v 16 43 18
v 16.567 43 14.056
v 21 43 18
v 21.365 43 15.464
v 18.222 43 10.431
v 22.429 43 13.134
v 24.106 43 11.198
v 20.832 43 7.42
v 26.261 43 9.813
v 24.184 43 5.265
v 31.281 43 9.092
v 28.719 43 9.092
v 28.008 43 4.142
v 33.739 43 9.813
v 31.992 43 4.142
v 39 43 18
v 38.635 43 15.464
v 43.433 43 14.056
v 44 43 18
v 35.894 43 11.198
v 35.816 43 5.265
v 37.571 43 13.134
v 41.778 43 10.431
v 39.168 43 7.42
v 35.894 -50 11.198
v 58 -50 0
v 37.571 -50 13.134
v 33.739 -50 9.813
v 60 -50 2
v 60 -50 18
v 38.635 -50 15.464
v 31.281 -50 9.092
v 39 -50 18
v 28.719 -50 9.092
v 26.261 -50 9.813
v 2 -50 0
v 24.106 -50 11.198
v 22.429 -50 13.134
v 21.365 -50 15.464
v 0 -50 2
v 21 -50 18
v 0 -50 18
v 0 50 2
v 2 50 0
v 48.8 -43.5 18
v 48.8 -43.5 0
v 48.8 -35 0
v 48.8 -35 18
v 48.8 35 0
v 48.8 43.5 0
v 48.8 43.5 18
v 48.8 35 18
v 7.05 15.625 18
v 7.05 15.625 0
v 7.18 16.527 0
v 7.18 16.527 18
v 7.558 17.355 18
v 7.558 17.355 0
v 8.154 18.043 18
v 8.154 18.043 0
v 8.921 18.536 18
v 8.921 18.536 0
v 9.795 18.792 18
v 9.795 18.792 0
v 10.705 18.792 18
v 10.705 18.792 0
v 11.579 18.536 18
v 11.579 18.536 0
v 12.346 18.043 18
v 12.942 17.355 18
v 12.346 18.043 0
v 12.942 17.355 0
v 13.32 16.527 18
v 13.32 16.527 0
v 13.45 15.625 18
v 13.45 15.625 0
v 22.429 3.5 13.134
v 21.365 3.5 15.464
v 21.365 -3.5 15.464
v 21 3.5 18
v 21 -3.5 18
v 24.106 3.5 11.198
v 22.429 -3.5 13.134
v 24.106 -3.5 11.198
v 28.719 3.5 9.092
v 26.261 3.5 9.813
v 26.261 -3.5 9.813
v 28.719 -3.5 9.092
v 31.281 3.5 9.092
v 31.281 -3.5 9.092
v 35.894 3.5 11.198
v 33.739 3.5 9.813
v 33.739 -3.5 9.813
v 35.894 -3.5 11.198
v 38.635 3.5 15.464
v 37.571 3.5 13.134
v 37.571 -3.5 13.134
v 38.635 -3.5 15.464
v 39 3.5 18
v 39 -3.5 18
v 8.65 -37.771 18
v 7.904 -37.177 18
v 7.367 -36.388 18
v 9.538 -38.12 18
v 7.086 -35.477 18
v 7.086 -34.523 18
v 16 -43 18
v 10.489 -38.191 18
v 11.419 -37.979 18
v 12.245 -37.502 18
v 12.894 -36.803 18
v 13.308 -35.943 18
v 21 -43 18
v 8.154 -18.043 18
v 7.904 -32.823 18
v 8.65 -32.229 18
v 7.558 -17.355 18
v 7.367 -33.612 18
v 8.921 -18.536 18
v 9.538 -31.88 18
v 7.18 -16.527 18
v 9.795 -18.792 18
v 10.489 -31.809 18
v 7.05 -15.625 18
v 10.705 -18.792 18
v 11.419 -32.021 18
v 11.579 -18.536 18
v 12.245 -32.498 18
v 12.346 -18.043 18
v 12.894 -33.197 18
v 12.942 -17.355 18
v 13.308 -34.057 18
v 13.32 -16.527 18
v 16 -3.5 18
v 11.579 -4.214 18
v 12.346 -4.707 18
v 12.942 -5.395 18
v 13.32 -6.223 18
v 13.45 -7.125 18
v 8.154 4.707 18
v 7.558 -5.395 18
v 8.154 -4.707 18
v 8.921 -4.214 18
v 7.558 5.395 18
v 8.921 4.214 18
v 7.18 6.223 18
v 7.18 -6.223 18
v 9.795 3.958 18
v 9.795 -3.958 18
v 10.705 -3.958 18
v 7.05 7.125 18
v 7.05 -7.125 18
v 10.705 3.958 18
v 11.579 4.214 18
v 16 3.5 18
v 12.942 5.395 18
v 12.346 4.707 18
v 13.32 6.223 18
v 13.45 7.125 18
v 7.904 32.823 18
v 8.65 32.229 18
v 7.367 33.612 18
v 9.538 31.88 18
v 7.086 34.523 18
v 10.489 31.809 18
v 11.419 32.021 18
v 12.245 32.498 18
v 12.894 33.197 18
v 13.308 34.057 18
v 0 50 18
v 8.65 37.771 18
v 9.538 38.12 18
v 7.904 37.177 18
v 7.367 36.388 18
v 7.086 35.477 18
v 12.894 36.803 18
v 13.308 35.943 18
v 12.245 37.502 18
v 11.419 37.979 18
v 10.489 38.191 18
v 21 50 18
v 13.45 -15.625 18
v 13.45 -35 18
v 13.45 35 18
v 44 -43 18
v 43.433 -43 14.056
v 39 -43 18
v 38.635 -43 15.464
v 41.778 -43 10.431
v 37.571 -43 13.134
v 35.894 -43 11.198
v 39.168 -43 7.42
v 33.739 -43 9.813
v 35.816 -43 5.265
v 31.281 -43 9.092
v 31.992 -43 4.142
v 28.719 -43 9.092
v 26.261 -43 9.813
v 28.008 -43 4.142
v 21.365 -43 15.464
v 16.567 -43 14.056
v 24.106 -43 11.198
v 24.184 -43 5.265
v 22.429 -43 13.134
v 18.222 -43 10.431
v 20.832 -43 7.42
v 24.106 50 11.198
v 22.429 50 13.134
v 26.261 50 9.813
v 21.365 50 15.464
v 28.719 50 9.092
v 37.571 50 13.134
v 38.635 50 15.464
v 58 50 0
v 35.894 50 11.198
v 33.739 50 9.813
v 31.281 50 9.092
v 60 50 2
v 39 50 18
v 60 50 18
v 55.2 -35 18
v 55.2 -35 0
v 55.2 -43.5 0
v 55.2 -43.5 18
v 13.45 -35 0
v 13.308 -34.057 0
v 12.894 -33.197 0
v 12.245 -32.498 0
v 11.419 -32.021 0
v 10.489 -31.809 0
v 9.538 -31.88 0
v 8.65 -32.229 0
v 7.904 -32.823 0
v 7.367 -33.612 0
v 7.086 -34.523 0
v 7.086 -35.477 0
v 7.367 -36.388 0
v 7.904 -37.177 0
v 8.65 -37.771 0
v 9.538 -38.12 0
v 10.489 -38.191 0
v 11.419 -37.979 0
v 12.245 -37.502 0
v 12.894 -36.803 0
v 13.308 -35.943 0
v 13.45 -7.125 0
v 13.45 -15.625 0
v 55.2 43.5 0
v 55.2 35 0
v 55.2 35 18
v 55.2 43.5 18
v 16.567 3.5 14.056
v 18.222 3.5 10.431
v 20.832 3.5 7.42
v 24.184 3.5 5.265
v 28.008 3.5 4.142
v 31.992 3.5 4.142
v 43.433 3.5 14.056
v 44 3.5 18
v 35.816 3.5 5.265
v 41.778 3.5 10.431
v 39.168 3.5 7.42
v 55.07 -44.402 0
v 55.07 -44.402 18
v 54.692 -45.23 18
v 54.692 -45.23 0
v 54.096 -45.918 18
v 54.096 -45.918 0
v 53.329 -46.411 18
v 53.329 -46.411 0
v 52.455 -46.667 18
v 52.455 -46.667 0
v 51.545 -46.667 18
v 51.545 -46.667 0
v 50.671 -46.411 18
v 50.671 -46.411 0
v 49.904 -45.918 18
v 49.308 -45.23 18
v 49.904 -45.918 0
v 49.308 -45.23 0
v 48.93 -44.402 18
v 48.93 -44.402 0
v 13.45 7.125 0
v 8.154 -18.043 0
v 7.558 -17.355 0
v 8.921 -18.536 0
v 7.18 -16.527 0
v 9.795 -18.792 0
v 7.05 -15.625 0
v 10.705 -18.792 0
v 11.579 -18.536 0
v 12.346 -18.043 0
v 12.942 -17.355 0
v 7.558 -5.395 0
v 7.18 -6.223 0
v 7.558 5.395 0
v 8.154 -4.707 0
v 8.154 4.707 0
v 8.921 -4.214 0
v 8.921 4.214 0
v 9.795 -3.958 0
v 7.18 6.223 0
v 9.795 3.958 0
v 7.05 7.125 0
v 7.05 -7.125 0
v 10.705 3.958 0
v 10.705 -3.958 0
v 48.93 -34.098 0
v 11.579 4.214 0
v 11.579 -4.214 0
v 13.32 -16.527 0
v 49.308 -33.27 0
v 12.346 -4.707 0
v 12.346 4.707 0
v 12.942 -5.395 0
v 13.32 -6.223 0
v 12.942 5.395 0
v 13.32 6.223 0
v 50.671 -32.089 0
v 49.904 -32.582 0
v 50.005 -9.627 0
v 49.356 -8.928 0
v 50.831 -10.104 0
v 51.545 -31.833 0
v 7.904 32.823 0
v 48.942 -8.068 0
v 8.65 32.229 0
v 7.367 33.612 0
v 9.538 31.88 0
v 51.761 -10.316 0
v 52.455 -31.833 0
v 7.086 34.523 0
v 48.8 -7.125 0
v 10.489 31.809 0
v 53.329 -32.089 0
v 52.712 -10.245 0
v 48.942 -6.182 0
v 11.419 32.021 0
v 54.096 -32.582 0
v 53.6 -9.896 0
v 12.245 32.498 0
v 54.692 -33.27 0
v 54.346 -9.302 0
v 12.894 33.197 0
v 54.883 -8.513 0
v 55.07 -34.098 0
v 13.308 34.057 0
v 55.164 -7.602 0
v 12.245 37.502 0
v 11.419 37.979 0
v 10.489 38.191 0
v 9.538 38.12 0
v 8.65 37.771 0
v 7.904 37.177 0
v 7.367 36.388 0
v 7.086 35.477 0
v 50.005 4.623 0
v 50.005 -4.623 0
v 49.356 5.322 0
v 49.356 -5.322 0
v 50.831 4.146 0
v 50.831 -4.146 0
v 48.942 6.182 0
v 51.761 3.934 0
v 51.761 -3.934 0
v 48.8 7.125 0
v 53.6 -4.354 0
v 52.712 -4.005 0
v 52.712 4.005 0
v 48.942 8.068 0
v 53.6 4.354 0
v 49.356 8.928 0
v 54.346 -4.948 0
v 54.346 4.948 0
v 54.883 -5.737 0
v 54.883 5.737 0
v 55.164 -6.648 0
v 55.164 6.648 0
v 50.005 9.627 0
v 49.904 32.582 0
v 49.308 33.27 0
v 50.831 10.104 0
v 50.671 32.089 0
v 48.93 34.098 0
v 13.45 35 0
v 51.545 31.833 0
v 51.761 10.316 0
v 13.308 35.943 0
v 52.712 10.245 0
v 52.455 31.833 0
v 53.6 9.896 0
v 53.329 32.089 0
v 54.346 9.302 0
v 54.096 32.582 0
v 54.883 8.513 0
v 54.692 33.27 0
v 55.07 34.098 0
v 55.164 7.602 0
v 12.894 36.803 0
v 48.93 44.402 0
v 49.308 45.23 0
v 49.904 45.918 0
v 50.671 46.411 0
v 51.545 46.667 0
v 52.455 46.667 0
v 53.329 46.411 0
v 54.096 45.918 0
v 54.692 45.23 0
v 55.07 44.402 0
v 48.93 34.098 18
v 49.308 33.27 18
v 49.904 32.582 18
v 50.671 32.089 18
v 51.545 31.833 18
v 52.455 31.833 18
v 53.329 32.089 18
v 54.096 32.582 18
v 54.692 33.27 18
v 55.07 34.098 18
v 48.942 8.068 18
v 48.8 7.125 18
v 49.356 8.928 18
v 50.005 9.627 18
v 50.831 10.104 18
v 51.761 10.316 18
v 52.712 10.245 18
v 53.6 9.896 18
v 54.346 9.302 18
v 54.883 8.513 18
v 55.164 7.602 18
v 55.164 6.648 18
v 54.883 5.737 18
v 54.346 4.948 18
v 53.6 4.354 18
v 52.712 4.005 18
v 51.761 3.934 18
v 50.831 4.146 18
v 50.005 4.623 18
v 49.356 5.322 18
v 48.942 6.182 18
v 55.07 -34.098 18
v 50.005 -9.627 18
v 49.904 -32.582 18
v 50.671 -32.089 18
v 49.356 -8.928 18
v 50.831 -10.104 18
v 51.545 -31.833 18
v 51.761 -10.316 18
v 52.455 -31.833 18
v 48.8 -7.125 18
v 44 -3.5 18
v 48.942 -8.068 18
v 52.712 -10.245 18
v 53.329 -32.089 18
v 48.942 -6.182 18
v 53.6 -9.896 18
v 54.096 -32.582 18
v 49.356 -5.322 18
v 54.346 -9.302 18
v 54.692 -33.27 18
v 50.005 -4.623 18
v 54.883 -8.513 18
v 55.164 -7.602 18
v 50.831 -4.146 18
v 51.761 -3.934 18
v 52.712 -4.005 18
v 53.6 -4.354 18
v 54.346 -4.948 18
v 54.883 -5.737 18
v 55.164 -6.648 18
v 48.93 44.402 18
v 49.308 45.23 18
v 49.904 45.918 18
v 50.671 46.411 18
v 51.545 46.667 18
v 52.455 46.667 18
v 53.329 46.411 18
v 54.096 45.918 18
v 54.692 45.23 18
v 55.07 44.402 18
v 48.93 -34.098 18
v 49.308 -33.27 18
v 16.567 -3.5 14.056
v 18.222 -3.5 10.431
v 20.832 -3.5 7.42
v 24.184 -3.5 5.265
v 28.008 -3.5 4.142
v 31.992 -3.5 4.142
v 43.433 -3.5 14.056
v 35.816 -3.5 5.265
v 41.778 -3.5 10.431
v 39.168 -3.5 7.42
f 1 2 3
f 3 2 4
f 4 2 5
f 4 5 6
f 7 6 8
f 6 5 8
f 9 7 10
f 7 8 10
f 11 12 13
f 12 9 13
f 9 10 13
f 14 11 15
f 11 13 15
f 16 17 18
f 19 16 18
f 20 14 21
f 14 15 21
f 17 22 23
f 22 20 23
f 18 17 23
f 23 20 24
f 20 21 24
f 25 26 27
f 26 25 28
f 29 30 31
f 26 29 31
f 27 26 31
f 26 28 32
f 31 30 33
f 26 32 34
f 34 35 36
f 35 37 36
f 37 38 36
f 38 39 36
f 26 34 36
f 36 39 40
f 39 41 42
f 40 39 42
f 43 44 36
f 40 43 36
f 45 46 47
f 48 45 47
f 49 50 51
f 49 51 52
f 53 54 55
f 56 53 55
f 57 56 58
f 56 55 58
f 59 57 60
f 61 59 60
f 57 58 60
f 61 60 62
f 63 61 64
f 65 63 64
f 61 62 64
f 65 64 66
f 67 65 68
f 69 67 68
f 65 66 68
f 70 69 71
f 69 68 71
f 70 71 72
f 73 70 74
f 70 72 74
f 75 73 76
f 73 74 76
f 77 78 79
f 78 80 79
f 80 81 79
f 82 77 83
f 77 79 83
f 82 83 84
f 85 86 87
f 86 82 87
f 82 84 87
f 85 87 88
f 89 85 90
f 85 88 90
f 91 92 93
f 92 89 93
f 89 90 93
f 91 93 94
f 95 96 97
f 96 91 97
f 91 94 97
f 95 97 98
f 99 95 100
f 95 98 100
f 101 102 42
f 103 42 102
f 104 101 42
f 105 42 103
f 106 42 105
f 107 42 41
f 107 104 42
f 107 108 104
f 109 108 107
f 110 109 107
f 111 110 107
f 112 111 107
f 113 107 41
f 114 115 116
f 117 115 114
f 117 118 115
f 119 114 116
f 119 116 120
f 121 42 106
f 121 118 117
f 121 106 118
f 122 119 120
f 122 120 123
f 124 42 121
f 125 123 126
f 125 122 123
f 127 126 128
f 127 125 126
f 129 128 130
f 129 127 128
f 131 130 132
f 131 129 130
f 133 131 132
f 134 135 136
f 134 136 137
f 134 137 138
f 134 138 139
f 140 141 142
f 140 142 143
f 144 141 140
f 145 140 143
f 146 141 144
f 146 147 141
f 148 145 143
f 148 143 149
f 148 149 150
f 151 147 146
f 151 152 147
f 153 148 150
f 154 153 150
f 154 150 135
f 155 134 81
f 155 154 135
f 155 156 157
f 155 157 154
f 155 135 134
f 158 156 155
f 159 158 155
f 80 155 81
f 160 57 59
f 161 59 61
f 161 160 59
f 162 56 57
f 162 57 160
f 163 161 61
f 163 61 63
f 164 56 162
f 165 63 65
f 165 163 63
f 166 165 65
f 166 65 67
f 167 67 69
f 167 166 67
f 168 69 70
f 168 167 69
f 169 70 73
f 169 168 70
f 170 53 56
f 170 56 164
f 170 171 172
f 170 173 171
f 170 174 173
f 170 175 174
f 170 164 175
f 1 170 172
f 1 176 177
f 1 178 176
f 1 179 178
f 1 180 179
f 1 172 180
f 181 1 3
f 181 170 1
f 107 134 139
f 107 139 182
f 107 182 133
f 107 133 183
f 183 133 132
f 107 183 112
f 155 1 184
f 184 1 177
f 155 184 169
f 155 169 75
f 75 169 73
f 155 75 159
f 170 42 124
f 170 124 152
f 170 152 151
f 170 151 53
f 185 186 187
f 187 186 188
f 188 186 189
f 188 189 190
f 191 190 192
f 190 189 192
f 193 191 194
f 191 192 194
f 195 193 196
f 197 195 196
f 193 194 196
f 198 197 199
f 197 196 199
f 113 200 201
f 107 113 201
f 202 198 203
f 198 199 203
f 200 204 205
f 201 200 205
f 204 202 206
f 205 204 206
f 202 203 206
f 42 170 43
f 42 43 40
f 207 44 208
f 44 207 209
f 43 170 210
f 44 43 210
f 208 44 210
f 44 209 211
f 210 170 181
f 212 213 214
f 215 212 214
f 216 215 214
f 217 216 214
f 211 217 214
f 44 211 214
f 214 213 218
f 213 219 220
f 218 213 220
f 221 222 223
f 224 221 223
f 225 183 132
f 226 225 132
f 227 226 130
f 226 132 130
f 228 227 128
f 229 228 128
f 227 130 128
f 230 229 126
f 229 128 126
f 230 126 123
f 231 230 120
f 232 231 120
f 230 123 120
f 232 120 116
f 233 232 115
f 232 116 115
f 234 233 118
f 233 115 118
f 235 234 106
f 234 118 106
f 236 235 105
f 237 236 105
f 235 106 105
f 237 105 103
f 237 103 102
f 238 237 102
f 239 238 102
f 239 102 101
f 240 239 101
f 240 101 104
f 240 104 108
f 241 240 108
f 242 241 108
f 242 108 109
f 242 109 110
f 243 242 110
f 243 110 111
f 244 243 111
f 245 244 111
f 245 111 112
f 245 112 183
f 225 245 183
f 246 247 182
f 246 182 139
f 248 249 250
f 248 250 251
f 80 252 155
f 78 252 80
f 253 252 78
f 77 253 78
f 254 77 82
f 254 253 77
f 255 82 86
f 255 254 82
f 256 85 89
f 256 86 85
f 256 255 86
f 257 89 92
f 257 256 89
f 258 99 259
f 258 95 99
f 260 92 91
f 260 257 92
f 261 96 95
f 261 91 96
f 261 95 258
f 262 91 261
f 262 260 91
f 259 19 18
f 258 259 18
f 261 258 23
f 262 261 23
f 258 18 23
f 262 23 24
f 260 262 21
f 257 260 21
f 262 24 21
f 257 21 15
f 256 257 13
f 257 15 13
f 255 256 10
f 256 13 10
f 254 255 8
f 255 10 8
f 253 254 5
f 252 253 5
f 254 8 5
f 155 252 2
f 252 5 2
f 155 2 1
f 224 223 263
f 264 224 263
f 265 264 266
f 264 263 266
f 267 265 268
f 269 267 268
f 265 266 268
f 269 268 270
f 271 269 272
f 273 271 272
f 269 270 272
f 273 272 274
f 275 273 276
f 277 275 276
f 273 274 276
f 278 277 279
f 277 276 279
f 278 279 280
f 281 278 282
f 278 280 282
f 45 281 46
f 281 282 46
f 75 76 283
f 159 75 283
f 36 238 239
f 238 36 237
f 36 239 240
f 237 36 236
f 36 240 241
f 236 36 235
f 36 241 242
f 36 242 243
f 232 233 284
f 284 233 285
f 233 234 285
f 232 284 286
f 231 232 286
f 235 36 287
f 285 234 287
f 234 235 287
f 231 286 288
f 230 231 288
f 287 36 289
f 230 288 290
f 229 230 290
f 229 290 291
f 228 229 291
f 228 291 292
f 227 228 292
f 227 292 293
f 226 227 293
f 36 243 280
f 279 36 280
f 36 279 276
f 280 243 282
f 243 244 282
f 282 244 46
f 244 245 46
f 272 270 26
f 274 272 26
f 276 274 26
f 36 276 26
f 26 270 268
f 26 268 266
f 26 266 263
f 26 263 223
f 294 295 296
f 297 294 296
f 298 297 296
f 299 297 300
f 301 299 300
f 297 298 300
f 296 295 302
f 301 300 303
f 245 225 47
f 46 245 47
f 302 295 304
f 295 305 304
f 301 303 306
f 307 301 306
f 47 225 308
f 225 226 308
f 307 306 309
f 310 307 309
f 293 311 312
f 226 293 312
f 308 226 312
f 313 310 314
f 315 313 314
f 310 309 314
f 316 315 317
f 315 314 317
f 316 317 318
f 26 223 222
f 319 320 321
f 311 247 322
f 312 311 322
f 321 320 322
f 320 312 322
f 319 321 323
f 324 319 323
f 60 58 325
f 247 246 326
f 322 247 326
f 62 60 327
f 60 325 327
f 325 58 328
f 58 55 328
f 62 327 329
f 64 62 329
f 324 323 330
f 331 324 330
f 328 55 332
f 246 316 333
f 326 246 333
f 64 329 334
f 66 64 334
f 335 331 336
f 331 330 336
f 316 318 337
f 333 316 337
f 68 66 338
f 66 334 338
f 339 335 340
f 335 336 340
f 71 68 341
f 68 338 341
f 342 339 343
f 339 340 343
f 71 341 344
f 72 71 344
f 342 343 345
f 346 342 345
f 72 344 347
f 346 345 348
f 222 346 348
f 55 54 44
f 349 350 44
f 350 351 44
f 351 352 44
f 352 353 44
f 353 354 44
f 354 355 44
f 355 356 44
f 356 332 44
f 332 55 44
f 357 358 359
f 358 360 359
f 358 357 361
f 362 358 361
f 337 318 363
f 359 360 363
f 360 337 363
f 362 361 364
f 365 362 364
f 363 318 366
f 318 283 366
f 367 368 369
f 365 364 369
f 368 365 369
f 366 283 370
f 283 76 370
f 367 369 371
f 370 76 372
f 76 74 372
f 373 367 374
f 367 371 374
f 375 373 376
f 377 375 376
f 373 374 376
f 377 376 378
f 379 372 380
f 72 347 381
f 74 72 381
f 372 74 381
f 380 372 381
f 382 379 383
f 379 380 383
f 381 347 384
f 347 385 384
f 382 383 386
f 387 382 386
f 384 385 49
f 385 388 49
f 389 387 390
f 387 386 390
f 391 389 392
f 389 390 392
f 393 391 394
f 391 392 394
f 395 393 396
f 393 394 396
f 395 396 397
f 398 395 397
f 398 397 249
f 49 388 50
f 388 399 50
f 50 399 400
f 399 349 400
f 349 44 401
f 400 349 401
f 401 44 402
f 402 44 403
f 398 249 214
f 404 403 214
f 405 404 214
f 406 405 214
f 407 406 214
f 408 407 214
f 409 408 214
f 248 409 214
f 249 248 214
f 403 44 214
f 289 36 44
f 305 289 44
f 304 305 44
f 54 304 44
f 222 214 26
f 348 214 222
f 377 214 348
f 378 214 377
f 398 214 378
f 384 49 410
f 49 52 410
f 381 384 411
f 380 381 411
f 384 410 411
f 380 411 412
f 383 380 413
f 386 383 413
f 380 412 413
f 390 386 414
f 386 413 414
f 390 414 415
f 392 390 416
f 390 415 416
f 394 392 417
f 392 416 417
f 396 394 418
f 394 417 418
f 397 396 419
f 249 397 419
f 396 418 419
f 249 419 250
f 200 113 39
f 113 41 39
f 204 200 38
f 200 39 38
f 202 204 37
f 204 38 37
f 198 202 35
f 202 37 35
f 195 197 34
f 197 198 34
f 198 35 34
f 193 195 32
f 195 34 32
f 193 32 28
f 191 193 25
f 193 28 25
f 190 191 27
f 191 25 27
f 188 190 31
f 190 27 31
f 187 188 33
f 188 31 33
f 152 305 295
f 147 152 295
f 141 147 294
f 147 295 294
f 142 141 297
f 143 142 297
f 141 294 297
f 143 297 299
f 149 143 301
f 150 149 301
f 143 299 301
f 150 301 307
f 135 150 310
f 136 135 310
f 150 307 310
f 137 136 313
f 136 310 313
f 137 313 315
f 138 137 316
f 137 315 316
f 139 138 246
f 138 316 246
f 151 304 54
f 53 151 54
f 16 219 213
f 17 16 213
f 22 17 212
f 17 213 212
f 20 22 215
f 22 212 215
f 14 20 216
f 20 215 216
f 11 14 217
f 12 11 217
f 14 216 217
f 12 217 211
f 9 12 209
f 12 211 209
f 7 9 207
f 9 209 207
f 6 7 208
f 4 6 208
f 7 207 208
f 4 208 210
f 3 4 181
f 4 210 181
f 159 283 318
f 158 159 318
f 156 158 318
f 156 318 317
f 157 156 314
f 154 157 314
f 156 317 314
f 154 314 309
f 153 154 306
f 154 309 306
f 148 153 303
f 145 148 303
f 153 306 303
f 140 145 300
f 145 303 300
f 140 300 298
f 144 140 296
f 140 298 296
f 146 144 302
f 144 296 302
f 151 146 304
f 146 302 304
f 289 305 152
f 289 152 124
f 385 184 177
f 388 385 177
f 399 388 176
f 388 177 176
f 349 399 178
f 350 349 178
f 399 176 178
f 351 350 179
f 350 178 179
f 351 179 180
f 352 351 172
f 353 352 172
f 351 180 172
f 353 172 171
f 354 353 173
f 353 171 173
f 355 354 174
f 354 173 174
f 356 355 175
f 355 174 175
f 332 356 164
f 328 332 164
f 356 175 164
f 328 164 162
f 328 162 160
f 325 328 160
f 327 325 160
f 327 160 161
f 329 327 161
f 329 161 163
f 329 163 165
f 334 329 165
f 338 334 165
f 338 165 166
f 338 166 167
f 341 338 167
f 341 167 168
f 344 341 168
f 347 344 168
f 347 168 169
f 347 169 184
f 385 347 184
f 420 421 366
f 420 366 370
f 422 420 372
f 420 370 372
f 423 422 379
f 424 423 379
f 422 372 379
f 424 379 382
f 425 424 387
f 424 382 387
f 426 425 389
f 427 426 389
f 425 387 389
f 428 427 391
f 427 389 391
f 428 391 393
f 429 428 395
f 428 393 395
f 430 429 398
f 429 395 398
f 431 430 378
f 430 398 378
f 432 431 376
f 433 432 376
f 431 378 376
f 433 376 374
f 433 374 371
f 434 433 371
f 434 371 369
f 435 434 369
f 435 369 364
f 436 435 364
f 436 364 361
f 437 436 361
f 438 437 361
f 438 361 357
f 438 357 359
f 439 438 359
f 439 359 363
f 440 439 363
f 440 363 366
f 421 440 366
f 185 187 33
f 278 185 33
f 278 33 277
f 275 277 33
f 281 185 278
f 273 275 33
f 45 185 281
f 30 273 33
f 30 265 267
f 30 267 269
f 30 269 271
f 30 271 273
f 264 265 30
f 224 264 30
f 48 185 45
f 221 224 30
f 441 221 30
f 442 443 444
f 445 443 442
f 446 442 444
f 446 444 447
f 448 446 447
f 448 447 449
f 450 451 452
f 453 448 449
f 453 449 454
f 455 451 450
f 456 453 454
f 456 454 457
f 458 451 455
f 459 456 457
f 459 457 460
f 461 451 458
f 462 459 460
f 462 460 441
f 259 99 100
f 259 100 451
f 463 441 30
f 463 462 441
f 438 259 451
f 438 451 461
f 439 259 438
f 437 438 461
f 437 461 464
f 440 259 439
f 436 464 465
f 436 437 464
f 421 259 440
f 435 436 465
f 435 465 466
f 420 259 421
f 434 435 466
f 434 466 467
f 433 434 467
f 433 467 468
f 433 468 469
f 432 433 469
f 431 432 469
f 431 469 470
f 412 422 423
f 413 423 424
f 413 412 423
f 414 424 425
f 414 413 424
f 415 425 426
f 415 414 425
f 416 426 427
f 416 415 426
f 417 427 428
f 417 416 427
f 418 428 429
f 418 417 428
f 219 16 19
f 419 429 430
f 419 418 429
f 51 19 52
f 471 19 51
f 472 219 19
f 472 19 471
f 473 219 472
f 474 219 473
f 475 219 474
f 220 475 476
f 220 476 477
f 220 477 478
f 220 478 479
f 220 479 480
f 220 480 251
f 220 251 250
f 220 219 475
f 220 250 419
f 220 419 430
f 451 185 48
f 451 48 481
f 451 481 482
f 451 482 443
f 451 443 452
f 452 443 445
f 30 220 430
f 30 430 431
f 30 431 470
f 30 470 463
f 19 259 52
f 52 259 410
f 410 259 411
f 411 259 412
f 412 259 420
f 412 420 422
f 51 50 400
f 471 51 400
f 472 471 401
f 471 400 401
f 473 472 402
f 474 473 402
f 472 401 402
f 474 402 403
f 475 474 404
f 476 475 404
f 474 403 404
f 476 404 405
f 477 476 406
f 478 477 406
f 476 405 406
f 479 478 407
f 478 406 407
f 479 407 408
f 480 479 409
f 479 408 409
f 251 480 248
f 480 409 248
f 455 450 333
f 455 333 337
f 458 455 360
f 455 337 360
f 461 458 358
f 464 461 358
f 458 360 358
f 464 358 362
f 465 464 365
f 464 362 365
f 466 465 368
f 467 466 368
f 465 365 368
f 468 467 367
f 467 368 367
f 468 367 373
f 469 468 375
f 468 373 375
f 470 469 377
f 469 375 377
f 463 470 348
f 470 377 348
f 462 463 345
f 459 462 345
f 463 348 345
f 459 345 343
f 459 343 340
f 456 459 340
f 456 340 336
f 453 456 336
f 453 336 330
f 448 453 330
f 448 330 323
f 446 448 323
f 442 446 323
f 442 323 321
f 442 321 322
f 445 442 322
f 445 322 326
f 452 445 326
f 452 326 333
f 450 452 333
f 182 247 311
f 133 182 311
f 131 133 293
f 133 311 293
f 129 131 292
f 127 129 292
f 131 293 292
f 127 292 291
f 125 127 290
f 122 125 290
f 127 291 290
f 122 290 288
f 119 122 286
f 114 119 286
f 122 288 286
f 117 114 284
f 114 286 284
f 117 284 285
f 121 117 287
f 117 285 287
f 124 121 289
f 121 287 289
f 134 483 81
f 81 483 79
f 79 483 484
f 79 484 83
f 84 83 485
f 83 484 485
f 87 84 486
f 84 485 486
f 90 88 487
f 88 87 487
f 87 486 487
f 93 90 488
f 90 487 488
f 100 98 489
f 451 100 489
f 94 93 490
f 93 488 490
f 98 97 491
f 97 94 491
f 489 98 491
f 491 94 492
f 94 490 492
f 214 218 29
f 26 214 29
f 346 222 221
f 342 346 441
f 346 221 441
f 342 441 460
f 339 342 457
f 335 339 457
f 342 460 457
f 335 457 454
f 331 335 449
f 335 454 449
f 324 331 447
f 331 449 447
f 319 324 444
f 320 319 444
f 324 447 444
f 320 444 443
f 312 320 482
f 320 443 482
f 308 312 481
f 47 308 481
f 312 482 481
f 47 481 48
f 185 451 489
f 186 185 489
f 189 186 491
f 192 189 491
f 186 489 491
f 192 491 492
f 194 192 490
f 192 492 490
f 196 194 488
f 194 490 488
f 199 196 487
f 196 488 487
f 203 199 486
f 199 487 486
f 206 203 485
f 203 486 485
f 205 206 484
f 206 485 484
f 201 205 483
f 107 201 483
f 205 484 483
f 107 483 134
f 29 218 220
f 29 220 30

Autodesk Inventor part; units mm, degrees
ref_plane "YZ Plane" through (0, 0, 0) normal (1, 0, 0) x (0, 1, 0)
ref_plane "XZ Plane" through (0, 0, 0) normal (0, 1, 0) x (-1, 0, 0)
ref_plane "XY Plane" through (0, 0, 0) normal (0, 0, 1) x (1, 0, 0)
sketch "Sketch1" plane through (0, 0, 0) normal (0, 0, 1) x (1, 0, 0)
  line L0 (-60, 50) -> (60, 50)
  line L1 (60, 50) -> (60, -50)
  line L2 (60, -50) -> (-60, -50)
  line L3 (-60, -50) -> (-60, 50)
  point P0 (0, 0)
  point P1 (-60, 0)
  point P2 (0, 50)
  dimension "d0" = 120
  dimension "d1" = 100
extrude "Extrusion1" add sketch "Sketch1" along normal blind 18
sketch "Sketch2" plane through (-60, 50, 0) normal (0, 1, 0) x (1, 0, 0)
  line L0 (0, 0) -> (120, 0) projected
  line L1 (0, 0) -> (0, -18) projected
  line L2 (120, -18) -> (0, -18) projected
  line L3 (120, 0) -> (120, -18) projected
  line L4 (120, -18) -> (0, -18) projected
  circle A0 centre (30, -18) radius 14
  circle A1 centre (90, -18) radius 14
  circle A2 centre (60, -18) radius 4.5
  point P0 (60, 0)
  dimension "d4" = 28
  dimension "d5" = 9
  dimension "d11" = 30
  dimension "d12" = 30
extrude "Extrusion2" cut sketch "Sketch2" against normal through all contours A0 L2 | L2 A0 | A1 L2 | L2 A1 | A2 L2 | L2 A2
sketch "Sketch3" plane through (0, 0, 18) normal (0, 0, 1) x (1, 0, 0)
  line L0 (16, -50) -> (16, 50) projected
  line L1 (16, 50) -> (4.5, 50) projected
  line L2 (4.5, 50) -> (4.5, -50) projected
  line L3 (4.5, -50) -> (16, -50) projected
  line L4 (-4.5, -50) -> (-4.5, 50) projected
  line L5 (-4.5, 50) -> (-16, 50) projected
  line L6 (-16, 50) -> (-16, -50) projected
  line L7 (-16, -50) -> (-4.5, -50) projected
  line L8 (-44, -50) -> (-44, 50) projected
  line L9 (-44, 50) -> (-60, 50) projected
  line L10 (-60, 50) -> (-60, -50) projected
  line L11 (-60, -50) -> (-44, -50) projected
  line L12 (44, 50) -> (44, -50) projected
  line L13 (44, -50) -> (60, -50) projected
  line L14 (60, -50) -> (60, 50) projected
  line L15 (60, 50) -> (44, 50) projected
  line L16 (-60, 50) -> (60, 50) construction
  line L17 (-52, 50) -> (-52, -50) construction
  line L18 (52, 50) -> (52, -50) construction
  line L19 (16, 50) -> (4.5, 50) construction
  line L20 (10.25, 50) -> (10.25, -50) construction
  line L21 (4.5, -50) -> (16, -50) construction
  line L22 (-10.25, 50) -> (-10.25, -50) construction
  line L23 (-16, -50) -> (-4.5, -50) construction
  circle A0 centre (-52, 35) radius 3.2
  circle A1 centre (-52, -35) radius 3.2
  circle A2 centre (52, 35) radius 3.2
  circle A3 centre (52, -35) radius 3.2
  circle A4 centre (-10.25, 35) radius 3.2
  circle A5 centre (10.25, 35) radius 3.2
  circle A6 centre (-10.25, -35) radius 3.2
  circle A7 centre (10.25, -35) radius 3.2
  dimension "d13" = 15
  dimension "d14" = 15
  dimension "d15" = 6.4
extrude "Extrusion3" cut sketch "Sketch3" against normal through all contours A0 | A1 | A2 | A3 | A4 | A5 | A6 | A7
sketch "Sketch6" plane through (0, 0, 0) normal (0, 0, -1) x (-1, 0, 0)
  circle A0 centre (-52, 35) radius 3.2 projected
  circle A1 centre (52, 35) radius 3.2 projected
  circle A2 centre (10.25, 35) radius 3.2 projected
  circle A3 centre (-10.25, 35) radius 3.2 projected
  circle A4 centre (-10.25, -35) radius 3.2 projected
  circle A5 centre (10.25, -35) radius 3.2 projected
  circle A6 centre (52, -35) radius 3.2 projected
  circle A7 centre (-52, -35) radius 3.2 projected
  line L0 (60, 50) -> (-60, 50) projected
  line L1 (-60, 50) -> (-60, -50) projected
  line L2 (-60, -50) -> (60, -50) projected
  line L3 (60, -50) -> (60, 50) projected
  line L4 (52, 7.125) -> (-52, 7.125) construction
  line L5 (-52, 7.125) -> (-52, -7.125) construction
  line L6 (-52, -7.125) -> (52, -7.125) construction
  line L7 (52, -7.125) -> (52, 7.125) construction
  circle A8 centre (-52, -7.125) radius 3.2
  circle A9 centre (52, -7.125) radius 3.2
  circle A10 centre (10.25, -7.125) radius 3.2
  circle A11 centre (-10.25, -7.125) radius 3.2
  circle A12 centre (-10.25, 7.125) radius 3.2
  circle A13 centre (10.25, 7.125) radius 3.2
  circle A14 centre (52, 7.125) radius 3.2
  circle A15 centre (-52, 7.125) radius 3.2
  point P0 (0, 0)
  point P1 (0, 7.125)
  point P2 (52, 0)
  dimension "d26" = 14.25
  dimension "d27" = 6.4
extrude "Extrusion6" cut sketch "Sketch6" against normal through all contours A8 | A9 | A10 | A11 | A12 | A13 | A14 | A15
sketch "Sketch7" plane through (0, 0, 0) normal (0, 0, -1) x (-1, 0, 0)
  circle A0 centre (52, 7.125) radius 3.2 projected
  circle A1 centre (-10.25, 7.125) radius 3.2 projected
  circle A2 centre (10.25, -7.125) radius 3.2 projected
  circle A3 centre (-52, -7.125) radius 3.2 projected
  circle A4 centre (52, -7.125) radius 3.2 projected
  circle A5 centre (-10.25, -7.125) radius 3.2 projected
  circle A6 centre (10.25, 7.125) radius 3.2 projected
  circle A7 centre (-52, 7.125) radius 3.2 projected
  circle A8 centre (-52, 35) radius 3.2 projected
  circle A9 centre (52, 35) radius 3.2 projected
  circle A10 centre (10.25, 35) radius 3.2 projected
  circle A11 centre (-10.25, 35) radius 3.2 projected
  circle A12 centre (-10.25, -35) radius 3.2 projected
  circle A13 centre (10.25, -35) radius 3.2 projected
  circle A14 centre (52, -35) radius 3.2 projected
  circle A15 centre (-52, -35) radius 3.2 projected
  line L0 (60, 50) -> (-60, 50) projected
  line L1 (-60, 50) -> (-60, -50) projected
  line L2 (-60, -50) -> (60, -50) projected
  line L3 (60, -50) -> (60, 50) projected
  line L4 (52, -35) -> (52, -43.5) construction
  line L5 (55.2, -35) -> (55.2, -43.5)
  line L6 (48.8, -43.5) -> (48.8, -35)
  arc A16 (55.2, -35) -> (48.8, -35) centre (52, -35) ccw
  arc A17 (48.8, -43.5) -> (55.2, -43.5) centre (52, -43.5) ccw
  line L7 (-52, -35) -> (-52, -43.5) construction
  line L8 (-55.2, -35) -> (-55.2, -43.5)
  line L9 (-48.8, -43.5) -> (-48.8, -35)
  arc A18 (-48.8, -35) -> (-55.2, -35) centre (-52, -35) ccw
  arc A19 (-55.2, -43.5) -> (-48.8, -43.5) centre (-52, -43.5) ccw
  line L10 (-52, 35) -> (-52, 43.5) construction
  line L11 (-55.2, 35) -> (-55.2, 43.5)
  line L12 (-48.8, 43.5) -> (-48.8, 35)
  arc A20 (-55.2, 35) -> (-48.8, 35) centre (-52, 35) ccw
  arc A21 (-48.8, 43.5) -> (-55.2, 43.5) centre (-52, 43.5) ccw
  line L13 (52, 35) -> (52, 43.5) construction
  line L14 (55.2, 35) -> (55.2, 43.5)
  line L15 (48.8, 43.5) -> (48.8, 35)
  arc A22 (48.8, 35) -> (55.2, 35) centre (52, 35) ccw
  arc A23 (55.2, 43.5) -> (48.8, 43.5) centre (52, 43.5) ccw
  line L16 (10.25, -7.125) -> (10.25, -15.625) construction
  line L17 (13.45, -7.125) -> (13.45, -15.625)
  line L18 (7.05, -15.625) -> (7.05, -7.125)
  arc A24 (13.45, -7.125) -> (7.05, -7.125) centre (10.25, -7.125) ccw
  arc A25 (7.05, -15.625) -> (13.45, -15.625) centre (10.25, -15.625) ccw
  line L19 (-10.25, -7.125) -> (-10.25, -15.625) construction
  line L20 (-7.05, -7.125) -> (-7.05, -15.625)
  line L21 (-13.45, -15.625) -> (-13.45, -7.125)
  arc A26 (-7.05, -7.125) -> (-13.45, -7.125) centre (-10.25, -7.125) ccw
  arc A27 (-13.45, -15.625) -> (-7.05, -15.625) centre (-10.25, -15.625) ccw
  line L22 (-10.25, 7.125) -> (-10.25, 15.625) construction
  line L23 (-7.05, 7.125) -> (-7.05, 15.625)
  line L24 (-13.45, 15.625) -> (-13.45, 7.125)
  arc A28 (-13.45, 7.125) -> (-7.05, 7.125) centre (-10.25, 7.125) ccw
  arc A29 (-7.05, 15.625) -> (-13.45, 15.625) centre (-10.25, 15.625) ccw
  line L25 (10.25, 7.125) -> (10.25, 15.625) construction
  line L26 (13.45, 7.125) -> (13.45, 15.625)
  line L27 (7.05, 15.625) -> (7.05, 7.125)
  arc A30 (7.05, 7.125) -> (13.45, 7.125) centre (10.25, 7.125) ccw
  arc A31 (13.45, 15.625) -> (7.05, 15.625) centre (10.25, 15.625) ccw
  point P0 (0, 0)
  point P1 (52, -39.25)
  point P2 (-52, -39.25)
  point P3 (-52, 39.25)
  point P4 (52, 39.25)
  point P5 (10.25, -11.375)
  point P6 (-10.25, -11.375)
  point P7 (-10.25, 11.375)
  point P8 (10.25, 11.375)
  dimension "d30" = 8.5
  dimension "d31" = 3.2
extrude "Extrusion7" cut sketch "Sketch7" against normal through all contours A1 L24 A29 L23 | L17 A25 L18 A2 | L20 A27 L21 A5 | A6 L27 A31 L26 | A8 L11 A21 L12 | A9 L15 A23 L14 | L5 A17 L6 A14 | L9 A19 L8 A15
sketch "Sketch9" plane through (-60, 50, 0) normal (0, 1, 0) x (1, 0, 0)
  arc A0 (104, -18) -> (76, -18) centre (90, -18) ccw construction
  line L0 (120, -18) -> (104, -18) construction
  line L1 (120, 0) -> (120, -18) construction
  line L2 (0, 0) -> (120, 0) construction
  line L3 (0, 0) -> (0, -18) construction
  line L4 (16, -18) -> (0, -18) construction
  arc A1 (44, -18) -> (16, -18) centre (30, -18) ccw construction
  line L5 (55.5, -18) -> (44, -18) construction
  arc A2 (64.5, -18) -> (55.5, -18) centre (60, -18) ccw projected
  line L6 (76, -18) -> (64.5, -18) construction
  circle A3 centre (90, -18) radius 8 construction
  circle A4 centre (30, -18) radius 8 construction
  arc A5 (99, -18) -> (81, -18) centre (90, -18) ccw
  arc A6 (39, -18) -> (21, -18) centre (30, -18) ccw
  line L7 (120, -18) -> (104, -18) projected
  line L8 (21, -18) -> (16, -18)
  line L9 (104, -18) -> (99, -18)
  line L10 (81, -18) -> (76, -18)
  line L11 (44, -18) -> (39, -18)
  arc A7 (104, -18) -> (76, -18) centre (90, -18) ccw
  arc A8 (44, -18) -> (16, -18) centre (30, -18) ccw
  point P0 (60, 0)
  dimension "d37" = 18
extrude "Extrusion9" add sketch "Sketch9" against normal blind 7
ref_plane "Work Plane1" through (-60, 0, 0) normal (0, 1, 0) x (1, 0, 0)
mirror "Mirror1" about plane through (-60, 0, 0) normal (0, 1, 0) of "Extrusion9"
sketch "Sketch10" plane through (-60, 0, 0) normal (0, 1, 0) x (1, 0, 0)
  line L0 (21, -18) -> (16, -18) projected
  arc A0 (39, -18) -> (21, -18) centre (30, -18) ccw projected
  line L1 (44, -18) -> (39, -18) projected
  arc A1 (44, -18) -> (16, -18) centre (30, -18) ccw projected
  line L2 (104, -18) -> (99, -18) projected
  arc A2 (104, -18) -> (76, -18) centre (90, -18) ccw projected
  line L3 (81, -18) -> (76, -18) projected
  arc A3 (99, -18) -> (81, -18) centre (90, -18) ccw projected
  point P0 (60, 0)
extrude "Extrusion10" add sketch "Sketch10" along normal mid plane 7
chamfer "Chamfer1" distance 2 angle 45 2 edges at (-60, 0, 0) (60, 0, 0)
sketch "Sketch12" plane through (0, 0, 0) normal (0, 0, -1) x (-1, 0, 0)
  line L0 (-58, -50) -> (-58, 50) construction
  line L1 (-58, -50) -> (58, -50) construction
  line L2 (58, 50) -> (58, -50) construction
  line L3 (58, 50) -> (-58, 50) construction
  line L4 (-48.8, -35) -> (-48.8, -43.5) construction
  arc A0 (-55.2, -43.5) -> (-48.8, -43.5) centre (-52, -43.5) ccw construction
  line L5 (-55.2, -43.5) -> (-55.2, -35) construction
  arc A1 (-48.8, -35) -> (-55.2, -35) centre (-52, -35) ccw construction
  line L6 (55.2, -35) -> (55.2, -43.5) construction
  arc A2 (48.8, -43.5) -> (55.2, -43.5) centre (52, -43.5) ccw construction
  line L7 (48.8, -43.5) -> (48.8, -35) construction
  arc A3 (55.2, -35) -> (48.8, -35) centre (52, -35) ccw construction
  circle A4 centre (10.25, -35) radius 3.2 construction
  circle A5 centre (-10.25, -35) radius 3.2 construction
  circle A6 centre (-10.25, 35) radius 3.2 construction
  circle A7 centre (10.25, 35) radius 3.2 construction
  line L8 (-55.2, 35) -> (-55.2, 43.5) construction
  arc A8 (-48.8, 43.5) -> (-55.2, 43.5) centre (-52, 43.5) ccw construction
  line L9 (-48.8, 43.5) -> (-48.8, 35) construction
  arc A9 (-55.2, 35) -> (-48.8, 35) centre (-52, 35) ccw construction
  circle A10 centre (-52, 7.125) radius 3.2 construction
  line L10 (-7.05, -7.125) -> (-7.05, -15.625) construction
  arc A11 (-13.45, -15.625) -> (-7.05, -15.625) centre (-10.25, -15.625) ccw construction
  line L11 (-13.45, -15.625) -> (-13.45, -7.125) construction
  arc A12 (-7.05, -7.125) -> (-13.45, -7.125) centre (-10.25, -7.125) ccw construction
  circle A13 centre (52, -7.125) radius 3.2 construction
  circle A14 centre (-52, -7.125) radius 3.2 construction
  line L12 (13.45, -7.125) -> (13.45, -15.625) construction
  arc A15 (7.05, -15.625) -> (13.45, -15.625) centre (10.25, -15.625) ccw construction
  line L13 (7.05, -15.625) -> (7.05, -7.125) construction
  arc A16 (13.45, -7.125) -> (7.05, -7.125) centre (10.25, -7.125) ccw construction
  circle A17 centre (52, 7.125) radius 3.2 construction
  line L14 (13.45, 15.625) -> (13.45, 7.125) construction
  arc A18 (7.05, 7.125) -> (13.45, 7.125) centre (10.25, 7.125) ccw construction
  line L15 (7.05, 7.125) -> (7.05, 15.625) construction
  arc A19 (13.45, 15.625) -> (7.05, 15.625) centre (10.25, 15.625) ccw construction
  line L16 (55.2, 43.5) -> (55.2, 35) construction
  arc A20 (48.8, 35) -> (55.2, 35) centre (52, 35) ccw construction
  line L17 (48.8, 35) -> (48.8, 43.5) construction
  arc A21 (55.2, 43.5) -> (48.8, 43.5) centre (52, 43.5) ccw construction
  line L18 (-7.05, 15.625) -> (-7.05, 7.125) construction
  arc A22 (-13.45, 7.125) -> (-7.05, 7.125) centre (-10.25, 7.125) ccw construction
  line L19 (-13.45, 7.125) -> (-13.45, 15.625) construction
  arc A23 (-7.05, 15.625) -> (-13.45, 15.625) centre (-10.25, 15.625) ccw construction
  line L20 (60, 50) -> (58, 50) construction
  line L21 (58, 50) -> (58, -50) construction
  line L22 (58, -50) -> (60, -50) construction
  line L23 (60, -50) -> (60, 50) construction
  line L24 (-60, -50) -> (-58, -50) construction
  line L25 (-58, -50) -> (-58, 50) construction
  line L26 (-58, 50) -> (-60, 50) construction
  line L27 (-60, 50) -> (-60, -50) construction
  line L28 (60, 50) -> (0, 50)
  line L29 (0, 50) -> (0, -50)
  line L30 (0, -50) -> (60, -50)
  line L31 (60, -50) -> (60, 50)
  point P0 (0, 0)
extrude "Extrusion11" cut sketch "Sketch12" against normal through all
sketch "Sketch13" plane through (0, 0, 18) normal (0, 0, 1) x (1, 0, 0)
  line L0 (0, 50) -> (0, -50) projected
  line L1 (4.5, -50) -> (0, -50) projected
  line L2 (4.5, 50) -> (4.5, -50) projected
  line L3 (0, 50) -> (4.5, 50) projected
  point P0 (0, 0)
extrude "Extrusion12" add sketch "Sketch13" against normal up to surface (18 mm away)
chamfer "Chamfer2" distance 2 angle 45 1 edges at (0, 0, 0)
properties part number "AXCARv4" material "PC/ABS Plastic"
